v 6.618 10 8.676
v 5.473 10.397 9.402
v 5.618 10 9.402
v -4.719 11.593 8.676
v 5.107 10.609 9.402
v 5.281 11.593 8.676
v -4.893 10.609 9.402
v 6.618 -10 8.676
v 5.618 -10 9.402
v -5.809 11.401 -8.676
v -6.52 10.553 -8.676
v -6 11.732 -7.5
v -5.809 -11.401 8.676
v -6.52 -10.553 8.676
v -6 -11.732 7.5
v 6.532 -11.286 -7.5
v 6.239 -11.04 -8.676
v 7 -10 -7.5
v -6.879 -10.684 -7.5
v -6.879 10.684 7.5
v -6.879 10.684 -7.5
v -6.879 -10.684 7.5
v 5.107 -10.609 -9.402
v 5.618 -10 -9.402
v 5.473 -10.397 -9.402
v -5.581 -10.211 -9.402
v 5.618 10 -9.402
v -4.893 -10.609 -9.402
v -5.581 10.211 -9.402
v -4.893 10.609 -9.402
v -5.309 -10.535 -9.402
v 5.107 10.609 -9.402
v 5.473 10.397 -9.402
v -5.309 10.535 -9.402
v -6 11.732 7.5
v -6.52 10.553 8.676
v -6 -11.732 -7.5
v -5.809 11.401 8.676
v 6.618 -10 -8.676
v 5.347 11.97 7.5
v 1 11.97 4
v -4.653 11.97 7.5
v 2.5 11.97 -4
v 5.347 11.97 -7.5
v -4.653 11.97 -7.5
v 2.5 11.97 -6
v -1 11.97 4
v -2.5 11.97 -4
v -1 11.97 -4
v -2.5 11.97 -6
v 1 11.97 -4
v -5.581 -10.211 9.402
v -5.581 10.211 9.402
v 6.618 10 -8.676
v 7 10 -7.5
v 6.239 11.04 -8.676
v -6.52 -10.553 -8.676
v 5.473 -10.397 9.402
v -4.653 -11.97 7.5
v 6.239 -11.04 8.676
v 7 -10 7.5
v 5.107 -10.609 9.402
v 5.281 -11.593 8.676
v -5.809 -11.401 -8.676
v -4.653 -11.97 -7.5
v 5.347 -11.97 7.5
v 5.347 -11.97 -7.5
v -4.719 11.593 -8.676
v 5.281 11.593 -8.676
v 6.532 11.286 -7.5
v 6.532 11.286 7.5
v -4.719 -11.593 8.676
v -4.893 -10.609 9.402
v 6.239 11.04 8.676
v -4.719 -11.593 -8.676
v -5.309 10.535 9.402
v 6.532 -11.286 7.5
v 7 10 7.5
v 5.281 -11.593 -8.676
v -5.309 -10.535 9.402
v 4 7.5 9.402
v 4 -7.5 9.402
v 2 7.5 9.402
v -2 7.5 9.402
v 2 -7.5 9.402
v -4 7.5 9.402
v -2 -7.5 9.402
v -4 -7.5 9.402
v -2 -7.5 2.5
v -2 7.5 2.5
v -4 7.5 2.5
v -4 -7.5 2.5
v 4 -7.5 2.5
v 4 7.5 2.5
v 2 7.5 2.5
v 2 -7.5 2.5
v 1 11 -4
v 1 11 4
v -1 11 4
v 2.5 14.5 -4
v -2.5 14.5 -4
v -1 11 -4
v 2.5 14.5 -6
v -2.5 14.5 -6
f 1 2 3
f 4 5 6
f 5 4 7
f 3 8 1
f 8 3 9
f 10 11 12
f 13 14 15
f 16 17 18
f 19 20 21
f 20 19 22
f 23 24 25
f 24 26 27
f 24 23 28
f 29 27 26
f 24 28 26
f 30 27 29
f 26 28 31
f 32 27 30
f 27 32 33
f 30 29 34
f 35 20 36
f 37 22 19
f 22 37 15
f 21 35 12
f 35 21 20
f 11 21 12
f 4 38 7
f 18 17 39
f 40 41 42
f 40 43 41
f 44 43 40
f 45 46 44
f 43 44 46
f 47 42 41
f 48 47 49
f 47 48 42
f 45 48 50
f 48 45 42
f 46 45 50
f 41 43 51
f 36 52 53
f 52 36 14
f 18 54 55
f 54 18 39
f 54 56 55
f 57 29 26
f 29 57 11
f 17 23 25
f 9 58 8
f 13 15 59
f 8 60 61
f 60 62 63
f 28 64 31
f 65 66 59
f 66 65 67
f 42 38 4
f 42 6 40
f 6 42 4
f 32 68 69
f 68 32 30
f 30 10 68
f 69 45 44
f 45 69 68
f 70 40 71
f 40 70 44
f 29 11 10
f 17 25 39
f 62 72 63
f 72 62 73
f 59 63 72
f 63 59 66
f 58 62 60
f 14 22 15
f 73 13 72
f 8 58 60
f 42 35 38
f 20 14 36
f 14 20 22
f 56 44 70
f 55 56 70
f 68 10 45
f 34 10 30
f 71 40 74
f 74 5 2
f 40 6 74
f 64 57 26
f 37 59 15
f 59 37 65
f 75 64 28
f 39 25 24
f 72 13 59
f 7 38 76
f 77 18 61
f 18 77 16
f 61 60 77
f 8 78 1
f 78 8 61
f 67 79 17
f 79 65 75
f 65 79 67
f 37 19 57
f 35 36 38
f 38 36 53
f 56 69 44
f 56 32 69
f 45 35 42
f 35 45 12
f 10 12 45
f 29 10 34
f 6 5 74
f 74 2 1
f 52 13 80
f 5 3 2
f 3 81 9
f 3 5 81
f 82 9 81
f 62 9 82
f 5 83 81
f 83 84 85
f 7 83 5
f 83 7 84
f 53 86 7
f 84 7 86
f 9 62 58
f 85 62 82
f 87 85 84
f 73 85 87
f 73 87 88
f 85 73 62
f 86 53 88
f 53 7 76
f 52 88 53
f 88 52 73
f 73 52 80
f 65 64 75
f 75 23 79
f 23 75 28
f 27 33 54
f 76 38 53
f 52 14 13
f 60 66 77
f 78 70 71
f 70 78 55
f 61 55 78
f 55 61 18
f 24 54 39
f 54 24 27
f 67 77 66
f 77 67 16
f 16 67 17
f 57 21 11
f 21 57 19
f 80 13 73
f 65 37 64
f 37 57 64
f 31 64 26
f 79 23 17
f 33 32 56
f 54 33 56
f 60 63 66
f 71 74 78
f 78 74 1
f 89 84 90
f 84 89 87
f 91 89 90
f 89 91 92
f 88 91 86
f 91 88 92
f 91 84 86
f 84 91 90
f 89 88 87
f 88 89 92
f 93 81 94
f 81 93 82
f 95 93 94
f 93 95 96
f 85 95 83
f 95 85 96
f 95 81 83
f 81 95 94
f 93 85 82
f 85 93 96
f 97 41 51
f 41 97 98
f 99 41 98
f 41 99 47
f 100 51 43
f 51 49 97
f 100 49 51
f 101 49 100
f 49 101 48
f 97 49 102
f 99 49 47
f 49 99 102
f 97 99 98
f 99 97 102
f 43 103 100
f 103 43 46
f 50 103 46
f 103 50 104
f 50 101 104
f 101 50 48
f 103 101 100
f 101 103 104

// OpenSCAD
module base(){
	$fn=9;
	minkowski()
	{
	 cube(size= [10,20,15], center=true);
	 sphere(r=2,h=1);
	}
}//end of platform base

module toast_slot(x,y,z){
translate([x,y,z])
cube(size=[2,15,15], center=true);
}

difference(){
base();
toast_slot(-3,0,10);
toast_slot(3,0,10);
translate([0,12,0])
cube(size=[2,2,8], center=true);
}//end of difference

translate([0,12,-5])
cube(size=[5,5,2], center=true);
